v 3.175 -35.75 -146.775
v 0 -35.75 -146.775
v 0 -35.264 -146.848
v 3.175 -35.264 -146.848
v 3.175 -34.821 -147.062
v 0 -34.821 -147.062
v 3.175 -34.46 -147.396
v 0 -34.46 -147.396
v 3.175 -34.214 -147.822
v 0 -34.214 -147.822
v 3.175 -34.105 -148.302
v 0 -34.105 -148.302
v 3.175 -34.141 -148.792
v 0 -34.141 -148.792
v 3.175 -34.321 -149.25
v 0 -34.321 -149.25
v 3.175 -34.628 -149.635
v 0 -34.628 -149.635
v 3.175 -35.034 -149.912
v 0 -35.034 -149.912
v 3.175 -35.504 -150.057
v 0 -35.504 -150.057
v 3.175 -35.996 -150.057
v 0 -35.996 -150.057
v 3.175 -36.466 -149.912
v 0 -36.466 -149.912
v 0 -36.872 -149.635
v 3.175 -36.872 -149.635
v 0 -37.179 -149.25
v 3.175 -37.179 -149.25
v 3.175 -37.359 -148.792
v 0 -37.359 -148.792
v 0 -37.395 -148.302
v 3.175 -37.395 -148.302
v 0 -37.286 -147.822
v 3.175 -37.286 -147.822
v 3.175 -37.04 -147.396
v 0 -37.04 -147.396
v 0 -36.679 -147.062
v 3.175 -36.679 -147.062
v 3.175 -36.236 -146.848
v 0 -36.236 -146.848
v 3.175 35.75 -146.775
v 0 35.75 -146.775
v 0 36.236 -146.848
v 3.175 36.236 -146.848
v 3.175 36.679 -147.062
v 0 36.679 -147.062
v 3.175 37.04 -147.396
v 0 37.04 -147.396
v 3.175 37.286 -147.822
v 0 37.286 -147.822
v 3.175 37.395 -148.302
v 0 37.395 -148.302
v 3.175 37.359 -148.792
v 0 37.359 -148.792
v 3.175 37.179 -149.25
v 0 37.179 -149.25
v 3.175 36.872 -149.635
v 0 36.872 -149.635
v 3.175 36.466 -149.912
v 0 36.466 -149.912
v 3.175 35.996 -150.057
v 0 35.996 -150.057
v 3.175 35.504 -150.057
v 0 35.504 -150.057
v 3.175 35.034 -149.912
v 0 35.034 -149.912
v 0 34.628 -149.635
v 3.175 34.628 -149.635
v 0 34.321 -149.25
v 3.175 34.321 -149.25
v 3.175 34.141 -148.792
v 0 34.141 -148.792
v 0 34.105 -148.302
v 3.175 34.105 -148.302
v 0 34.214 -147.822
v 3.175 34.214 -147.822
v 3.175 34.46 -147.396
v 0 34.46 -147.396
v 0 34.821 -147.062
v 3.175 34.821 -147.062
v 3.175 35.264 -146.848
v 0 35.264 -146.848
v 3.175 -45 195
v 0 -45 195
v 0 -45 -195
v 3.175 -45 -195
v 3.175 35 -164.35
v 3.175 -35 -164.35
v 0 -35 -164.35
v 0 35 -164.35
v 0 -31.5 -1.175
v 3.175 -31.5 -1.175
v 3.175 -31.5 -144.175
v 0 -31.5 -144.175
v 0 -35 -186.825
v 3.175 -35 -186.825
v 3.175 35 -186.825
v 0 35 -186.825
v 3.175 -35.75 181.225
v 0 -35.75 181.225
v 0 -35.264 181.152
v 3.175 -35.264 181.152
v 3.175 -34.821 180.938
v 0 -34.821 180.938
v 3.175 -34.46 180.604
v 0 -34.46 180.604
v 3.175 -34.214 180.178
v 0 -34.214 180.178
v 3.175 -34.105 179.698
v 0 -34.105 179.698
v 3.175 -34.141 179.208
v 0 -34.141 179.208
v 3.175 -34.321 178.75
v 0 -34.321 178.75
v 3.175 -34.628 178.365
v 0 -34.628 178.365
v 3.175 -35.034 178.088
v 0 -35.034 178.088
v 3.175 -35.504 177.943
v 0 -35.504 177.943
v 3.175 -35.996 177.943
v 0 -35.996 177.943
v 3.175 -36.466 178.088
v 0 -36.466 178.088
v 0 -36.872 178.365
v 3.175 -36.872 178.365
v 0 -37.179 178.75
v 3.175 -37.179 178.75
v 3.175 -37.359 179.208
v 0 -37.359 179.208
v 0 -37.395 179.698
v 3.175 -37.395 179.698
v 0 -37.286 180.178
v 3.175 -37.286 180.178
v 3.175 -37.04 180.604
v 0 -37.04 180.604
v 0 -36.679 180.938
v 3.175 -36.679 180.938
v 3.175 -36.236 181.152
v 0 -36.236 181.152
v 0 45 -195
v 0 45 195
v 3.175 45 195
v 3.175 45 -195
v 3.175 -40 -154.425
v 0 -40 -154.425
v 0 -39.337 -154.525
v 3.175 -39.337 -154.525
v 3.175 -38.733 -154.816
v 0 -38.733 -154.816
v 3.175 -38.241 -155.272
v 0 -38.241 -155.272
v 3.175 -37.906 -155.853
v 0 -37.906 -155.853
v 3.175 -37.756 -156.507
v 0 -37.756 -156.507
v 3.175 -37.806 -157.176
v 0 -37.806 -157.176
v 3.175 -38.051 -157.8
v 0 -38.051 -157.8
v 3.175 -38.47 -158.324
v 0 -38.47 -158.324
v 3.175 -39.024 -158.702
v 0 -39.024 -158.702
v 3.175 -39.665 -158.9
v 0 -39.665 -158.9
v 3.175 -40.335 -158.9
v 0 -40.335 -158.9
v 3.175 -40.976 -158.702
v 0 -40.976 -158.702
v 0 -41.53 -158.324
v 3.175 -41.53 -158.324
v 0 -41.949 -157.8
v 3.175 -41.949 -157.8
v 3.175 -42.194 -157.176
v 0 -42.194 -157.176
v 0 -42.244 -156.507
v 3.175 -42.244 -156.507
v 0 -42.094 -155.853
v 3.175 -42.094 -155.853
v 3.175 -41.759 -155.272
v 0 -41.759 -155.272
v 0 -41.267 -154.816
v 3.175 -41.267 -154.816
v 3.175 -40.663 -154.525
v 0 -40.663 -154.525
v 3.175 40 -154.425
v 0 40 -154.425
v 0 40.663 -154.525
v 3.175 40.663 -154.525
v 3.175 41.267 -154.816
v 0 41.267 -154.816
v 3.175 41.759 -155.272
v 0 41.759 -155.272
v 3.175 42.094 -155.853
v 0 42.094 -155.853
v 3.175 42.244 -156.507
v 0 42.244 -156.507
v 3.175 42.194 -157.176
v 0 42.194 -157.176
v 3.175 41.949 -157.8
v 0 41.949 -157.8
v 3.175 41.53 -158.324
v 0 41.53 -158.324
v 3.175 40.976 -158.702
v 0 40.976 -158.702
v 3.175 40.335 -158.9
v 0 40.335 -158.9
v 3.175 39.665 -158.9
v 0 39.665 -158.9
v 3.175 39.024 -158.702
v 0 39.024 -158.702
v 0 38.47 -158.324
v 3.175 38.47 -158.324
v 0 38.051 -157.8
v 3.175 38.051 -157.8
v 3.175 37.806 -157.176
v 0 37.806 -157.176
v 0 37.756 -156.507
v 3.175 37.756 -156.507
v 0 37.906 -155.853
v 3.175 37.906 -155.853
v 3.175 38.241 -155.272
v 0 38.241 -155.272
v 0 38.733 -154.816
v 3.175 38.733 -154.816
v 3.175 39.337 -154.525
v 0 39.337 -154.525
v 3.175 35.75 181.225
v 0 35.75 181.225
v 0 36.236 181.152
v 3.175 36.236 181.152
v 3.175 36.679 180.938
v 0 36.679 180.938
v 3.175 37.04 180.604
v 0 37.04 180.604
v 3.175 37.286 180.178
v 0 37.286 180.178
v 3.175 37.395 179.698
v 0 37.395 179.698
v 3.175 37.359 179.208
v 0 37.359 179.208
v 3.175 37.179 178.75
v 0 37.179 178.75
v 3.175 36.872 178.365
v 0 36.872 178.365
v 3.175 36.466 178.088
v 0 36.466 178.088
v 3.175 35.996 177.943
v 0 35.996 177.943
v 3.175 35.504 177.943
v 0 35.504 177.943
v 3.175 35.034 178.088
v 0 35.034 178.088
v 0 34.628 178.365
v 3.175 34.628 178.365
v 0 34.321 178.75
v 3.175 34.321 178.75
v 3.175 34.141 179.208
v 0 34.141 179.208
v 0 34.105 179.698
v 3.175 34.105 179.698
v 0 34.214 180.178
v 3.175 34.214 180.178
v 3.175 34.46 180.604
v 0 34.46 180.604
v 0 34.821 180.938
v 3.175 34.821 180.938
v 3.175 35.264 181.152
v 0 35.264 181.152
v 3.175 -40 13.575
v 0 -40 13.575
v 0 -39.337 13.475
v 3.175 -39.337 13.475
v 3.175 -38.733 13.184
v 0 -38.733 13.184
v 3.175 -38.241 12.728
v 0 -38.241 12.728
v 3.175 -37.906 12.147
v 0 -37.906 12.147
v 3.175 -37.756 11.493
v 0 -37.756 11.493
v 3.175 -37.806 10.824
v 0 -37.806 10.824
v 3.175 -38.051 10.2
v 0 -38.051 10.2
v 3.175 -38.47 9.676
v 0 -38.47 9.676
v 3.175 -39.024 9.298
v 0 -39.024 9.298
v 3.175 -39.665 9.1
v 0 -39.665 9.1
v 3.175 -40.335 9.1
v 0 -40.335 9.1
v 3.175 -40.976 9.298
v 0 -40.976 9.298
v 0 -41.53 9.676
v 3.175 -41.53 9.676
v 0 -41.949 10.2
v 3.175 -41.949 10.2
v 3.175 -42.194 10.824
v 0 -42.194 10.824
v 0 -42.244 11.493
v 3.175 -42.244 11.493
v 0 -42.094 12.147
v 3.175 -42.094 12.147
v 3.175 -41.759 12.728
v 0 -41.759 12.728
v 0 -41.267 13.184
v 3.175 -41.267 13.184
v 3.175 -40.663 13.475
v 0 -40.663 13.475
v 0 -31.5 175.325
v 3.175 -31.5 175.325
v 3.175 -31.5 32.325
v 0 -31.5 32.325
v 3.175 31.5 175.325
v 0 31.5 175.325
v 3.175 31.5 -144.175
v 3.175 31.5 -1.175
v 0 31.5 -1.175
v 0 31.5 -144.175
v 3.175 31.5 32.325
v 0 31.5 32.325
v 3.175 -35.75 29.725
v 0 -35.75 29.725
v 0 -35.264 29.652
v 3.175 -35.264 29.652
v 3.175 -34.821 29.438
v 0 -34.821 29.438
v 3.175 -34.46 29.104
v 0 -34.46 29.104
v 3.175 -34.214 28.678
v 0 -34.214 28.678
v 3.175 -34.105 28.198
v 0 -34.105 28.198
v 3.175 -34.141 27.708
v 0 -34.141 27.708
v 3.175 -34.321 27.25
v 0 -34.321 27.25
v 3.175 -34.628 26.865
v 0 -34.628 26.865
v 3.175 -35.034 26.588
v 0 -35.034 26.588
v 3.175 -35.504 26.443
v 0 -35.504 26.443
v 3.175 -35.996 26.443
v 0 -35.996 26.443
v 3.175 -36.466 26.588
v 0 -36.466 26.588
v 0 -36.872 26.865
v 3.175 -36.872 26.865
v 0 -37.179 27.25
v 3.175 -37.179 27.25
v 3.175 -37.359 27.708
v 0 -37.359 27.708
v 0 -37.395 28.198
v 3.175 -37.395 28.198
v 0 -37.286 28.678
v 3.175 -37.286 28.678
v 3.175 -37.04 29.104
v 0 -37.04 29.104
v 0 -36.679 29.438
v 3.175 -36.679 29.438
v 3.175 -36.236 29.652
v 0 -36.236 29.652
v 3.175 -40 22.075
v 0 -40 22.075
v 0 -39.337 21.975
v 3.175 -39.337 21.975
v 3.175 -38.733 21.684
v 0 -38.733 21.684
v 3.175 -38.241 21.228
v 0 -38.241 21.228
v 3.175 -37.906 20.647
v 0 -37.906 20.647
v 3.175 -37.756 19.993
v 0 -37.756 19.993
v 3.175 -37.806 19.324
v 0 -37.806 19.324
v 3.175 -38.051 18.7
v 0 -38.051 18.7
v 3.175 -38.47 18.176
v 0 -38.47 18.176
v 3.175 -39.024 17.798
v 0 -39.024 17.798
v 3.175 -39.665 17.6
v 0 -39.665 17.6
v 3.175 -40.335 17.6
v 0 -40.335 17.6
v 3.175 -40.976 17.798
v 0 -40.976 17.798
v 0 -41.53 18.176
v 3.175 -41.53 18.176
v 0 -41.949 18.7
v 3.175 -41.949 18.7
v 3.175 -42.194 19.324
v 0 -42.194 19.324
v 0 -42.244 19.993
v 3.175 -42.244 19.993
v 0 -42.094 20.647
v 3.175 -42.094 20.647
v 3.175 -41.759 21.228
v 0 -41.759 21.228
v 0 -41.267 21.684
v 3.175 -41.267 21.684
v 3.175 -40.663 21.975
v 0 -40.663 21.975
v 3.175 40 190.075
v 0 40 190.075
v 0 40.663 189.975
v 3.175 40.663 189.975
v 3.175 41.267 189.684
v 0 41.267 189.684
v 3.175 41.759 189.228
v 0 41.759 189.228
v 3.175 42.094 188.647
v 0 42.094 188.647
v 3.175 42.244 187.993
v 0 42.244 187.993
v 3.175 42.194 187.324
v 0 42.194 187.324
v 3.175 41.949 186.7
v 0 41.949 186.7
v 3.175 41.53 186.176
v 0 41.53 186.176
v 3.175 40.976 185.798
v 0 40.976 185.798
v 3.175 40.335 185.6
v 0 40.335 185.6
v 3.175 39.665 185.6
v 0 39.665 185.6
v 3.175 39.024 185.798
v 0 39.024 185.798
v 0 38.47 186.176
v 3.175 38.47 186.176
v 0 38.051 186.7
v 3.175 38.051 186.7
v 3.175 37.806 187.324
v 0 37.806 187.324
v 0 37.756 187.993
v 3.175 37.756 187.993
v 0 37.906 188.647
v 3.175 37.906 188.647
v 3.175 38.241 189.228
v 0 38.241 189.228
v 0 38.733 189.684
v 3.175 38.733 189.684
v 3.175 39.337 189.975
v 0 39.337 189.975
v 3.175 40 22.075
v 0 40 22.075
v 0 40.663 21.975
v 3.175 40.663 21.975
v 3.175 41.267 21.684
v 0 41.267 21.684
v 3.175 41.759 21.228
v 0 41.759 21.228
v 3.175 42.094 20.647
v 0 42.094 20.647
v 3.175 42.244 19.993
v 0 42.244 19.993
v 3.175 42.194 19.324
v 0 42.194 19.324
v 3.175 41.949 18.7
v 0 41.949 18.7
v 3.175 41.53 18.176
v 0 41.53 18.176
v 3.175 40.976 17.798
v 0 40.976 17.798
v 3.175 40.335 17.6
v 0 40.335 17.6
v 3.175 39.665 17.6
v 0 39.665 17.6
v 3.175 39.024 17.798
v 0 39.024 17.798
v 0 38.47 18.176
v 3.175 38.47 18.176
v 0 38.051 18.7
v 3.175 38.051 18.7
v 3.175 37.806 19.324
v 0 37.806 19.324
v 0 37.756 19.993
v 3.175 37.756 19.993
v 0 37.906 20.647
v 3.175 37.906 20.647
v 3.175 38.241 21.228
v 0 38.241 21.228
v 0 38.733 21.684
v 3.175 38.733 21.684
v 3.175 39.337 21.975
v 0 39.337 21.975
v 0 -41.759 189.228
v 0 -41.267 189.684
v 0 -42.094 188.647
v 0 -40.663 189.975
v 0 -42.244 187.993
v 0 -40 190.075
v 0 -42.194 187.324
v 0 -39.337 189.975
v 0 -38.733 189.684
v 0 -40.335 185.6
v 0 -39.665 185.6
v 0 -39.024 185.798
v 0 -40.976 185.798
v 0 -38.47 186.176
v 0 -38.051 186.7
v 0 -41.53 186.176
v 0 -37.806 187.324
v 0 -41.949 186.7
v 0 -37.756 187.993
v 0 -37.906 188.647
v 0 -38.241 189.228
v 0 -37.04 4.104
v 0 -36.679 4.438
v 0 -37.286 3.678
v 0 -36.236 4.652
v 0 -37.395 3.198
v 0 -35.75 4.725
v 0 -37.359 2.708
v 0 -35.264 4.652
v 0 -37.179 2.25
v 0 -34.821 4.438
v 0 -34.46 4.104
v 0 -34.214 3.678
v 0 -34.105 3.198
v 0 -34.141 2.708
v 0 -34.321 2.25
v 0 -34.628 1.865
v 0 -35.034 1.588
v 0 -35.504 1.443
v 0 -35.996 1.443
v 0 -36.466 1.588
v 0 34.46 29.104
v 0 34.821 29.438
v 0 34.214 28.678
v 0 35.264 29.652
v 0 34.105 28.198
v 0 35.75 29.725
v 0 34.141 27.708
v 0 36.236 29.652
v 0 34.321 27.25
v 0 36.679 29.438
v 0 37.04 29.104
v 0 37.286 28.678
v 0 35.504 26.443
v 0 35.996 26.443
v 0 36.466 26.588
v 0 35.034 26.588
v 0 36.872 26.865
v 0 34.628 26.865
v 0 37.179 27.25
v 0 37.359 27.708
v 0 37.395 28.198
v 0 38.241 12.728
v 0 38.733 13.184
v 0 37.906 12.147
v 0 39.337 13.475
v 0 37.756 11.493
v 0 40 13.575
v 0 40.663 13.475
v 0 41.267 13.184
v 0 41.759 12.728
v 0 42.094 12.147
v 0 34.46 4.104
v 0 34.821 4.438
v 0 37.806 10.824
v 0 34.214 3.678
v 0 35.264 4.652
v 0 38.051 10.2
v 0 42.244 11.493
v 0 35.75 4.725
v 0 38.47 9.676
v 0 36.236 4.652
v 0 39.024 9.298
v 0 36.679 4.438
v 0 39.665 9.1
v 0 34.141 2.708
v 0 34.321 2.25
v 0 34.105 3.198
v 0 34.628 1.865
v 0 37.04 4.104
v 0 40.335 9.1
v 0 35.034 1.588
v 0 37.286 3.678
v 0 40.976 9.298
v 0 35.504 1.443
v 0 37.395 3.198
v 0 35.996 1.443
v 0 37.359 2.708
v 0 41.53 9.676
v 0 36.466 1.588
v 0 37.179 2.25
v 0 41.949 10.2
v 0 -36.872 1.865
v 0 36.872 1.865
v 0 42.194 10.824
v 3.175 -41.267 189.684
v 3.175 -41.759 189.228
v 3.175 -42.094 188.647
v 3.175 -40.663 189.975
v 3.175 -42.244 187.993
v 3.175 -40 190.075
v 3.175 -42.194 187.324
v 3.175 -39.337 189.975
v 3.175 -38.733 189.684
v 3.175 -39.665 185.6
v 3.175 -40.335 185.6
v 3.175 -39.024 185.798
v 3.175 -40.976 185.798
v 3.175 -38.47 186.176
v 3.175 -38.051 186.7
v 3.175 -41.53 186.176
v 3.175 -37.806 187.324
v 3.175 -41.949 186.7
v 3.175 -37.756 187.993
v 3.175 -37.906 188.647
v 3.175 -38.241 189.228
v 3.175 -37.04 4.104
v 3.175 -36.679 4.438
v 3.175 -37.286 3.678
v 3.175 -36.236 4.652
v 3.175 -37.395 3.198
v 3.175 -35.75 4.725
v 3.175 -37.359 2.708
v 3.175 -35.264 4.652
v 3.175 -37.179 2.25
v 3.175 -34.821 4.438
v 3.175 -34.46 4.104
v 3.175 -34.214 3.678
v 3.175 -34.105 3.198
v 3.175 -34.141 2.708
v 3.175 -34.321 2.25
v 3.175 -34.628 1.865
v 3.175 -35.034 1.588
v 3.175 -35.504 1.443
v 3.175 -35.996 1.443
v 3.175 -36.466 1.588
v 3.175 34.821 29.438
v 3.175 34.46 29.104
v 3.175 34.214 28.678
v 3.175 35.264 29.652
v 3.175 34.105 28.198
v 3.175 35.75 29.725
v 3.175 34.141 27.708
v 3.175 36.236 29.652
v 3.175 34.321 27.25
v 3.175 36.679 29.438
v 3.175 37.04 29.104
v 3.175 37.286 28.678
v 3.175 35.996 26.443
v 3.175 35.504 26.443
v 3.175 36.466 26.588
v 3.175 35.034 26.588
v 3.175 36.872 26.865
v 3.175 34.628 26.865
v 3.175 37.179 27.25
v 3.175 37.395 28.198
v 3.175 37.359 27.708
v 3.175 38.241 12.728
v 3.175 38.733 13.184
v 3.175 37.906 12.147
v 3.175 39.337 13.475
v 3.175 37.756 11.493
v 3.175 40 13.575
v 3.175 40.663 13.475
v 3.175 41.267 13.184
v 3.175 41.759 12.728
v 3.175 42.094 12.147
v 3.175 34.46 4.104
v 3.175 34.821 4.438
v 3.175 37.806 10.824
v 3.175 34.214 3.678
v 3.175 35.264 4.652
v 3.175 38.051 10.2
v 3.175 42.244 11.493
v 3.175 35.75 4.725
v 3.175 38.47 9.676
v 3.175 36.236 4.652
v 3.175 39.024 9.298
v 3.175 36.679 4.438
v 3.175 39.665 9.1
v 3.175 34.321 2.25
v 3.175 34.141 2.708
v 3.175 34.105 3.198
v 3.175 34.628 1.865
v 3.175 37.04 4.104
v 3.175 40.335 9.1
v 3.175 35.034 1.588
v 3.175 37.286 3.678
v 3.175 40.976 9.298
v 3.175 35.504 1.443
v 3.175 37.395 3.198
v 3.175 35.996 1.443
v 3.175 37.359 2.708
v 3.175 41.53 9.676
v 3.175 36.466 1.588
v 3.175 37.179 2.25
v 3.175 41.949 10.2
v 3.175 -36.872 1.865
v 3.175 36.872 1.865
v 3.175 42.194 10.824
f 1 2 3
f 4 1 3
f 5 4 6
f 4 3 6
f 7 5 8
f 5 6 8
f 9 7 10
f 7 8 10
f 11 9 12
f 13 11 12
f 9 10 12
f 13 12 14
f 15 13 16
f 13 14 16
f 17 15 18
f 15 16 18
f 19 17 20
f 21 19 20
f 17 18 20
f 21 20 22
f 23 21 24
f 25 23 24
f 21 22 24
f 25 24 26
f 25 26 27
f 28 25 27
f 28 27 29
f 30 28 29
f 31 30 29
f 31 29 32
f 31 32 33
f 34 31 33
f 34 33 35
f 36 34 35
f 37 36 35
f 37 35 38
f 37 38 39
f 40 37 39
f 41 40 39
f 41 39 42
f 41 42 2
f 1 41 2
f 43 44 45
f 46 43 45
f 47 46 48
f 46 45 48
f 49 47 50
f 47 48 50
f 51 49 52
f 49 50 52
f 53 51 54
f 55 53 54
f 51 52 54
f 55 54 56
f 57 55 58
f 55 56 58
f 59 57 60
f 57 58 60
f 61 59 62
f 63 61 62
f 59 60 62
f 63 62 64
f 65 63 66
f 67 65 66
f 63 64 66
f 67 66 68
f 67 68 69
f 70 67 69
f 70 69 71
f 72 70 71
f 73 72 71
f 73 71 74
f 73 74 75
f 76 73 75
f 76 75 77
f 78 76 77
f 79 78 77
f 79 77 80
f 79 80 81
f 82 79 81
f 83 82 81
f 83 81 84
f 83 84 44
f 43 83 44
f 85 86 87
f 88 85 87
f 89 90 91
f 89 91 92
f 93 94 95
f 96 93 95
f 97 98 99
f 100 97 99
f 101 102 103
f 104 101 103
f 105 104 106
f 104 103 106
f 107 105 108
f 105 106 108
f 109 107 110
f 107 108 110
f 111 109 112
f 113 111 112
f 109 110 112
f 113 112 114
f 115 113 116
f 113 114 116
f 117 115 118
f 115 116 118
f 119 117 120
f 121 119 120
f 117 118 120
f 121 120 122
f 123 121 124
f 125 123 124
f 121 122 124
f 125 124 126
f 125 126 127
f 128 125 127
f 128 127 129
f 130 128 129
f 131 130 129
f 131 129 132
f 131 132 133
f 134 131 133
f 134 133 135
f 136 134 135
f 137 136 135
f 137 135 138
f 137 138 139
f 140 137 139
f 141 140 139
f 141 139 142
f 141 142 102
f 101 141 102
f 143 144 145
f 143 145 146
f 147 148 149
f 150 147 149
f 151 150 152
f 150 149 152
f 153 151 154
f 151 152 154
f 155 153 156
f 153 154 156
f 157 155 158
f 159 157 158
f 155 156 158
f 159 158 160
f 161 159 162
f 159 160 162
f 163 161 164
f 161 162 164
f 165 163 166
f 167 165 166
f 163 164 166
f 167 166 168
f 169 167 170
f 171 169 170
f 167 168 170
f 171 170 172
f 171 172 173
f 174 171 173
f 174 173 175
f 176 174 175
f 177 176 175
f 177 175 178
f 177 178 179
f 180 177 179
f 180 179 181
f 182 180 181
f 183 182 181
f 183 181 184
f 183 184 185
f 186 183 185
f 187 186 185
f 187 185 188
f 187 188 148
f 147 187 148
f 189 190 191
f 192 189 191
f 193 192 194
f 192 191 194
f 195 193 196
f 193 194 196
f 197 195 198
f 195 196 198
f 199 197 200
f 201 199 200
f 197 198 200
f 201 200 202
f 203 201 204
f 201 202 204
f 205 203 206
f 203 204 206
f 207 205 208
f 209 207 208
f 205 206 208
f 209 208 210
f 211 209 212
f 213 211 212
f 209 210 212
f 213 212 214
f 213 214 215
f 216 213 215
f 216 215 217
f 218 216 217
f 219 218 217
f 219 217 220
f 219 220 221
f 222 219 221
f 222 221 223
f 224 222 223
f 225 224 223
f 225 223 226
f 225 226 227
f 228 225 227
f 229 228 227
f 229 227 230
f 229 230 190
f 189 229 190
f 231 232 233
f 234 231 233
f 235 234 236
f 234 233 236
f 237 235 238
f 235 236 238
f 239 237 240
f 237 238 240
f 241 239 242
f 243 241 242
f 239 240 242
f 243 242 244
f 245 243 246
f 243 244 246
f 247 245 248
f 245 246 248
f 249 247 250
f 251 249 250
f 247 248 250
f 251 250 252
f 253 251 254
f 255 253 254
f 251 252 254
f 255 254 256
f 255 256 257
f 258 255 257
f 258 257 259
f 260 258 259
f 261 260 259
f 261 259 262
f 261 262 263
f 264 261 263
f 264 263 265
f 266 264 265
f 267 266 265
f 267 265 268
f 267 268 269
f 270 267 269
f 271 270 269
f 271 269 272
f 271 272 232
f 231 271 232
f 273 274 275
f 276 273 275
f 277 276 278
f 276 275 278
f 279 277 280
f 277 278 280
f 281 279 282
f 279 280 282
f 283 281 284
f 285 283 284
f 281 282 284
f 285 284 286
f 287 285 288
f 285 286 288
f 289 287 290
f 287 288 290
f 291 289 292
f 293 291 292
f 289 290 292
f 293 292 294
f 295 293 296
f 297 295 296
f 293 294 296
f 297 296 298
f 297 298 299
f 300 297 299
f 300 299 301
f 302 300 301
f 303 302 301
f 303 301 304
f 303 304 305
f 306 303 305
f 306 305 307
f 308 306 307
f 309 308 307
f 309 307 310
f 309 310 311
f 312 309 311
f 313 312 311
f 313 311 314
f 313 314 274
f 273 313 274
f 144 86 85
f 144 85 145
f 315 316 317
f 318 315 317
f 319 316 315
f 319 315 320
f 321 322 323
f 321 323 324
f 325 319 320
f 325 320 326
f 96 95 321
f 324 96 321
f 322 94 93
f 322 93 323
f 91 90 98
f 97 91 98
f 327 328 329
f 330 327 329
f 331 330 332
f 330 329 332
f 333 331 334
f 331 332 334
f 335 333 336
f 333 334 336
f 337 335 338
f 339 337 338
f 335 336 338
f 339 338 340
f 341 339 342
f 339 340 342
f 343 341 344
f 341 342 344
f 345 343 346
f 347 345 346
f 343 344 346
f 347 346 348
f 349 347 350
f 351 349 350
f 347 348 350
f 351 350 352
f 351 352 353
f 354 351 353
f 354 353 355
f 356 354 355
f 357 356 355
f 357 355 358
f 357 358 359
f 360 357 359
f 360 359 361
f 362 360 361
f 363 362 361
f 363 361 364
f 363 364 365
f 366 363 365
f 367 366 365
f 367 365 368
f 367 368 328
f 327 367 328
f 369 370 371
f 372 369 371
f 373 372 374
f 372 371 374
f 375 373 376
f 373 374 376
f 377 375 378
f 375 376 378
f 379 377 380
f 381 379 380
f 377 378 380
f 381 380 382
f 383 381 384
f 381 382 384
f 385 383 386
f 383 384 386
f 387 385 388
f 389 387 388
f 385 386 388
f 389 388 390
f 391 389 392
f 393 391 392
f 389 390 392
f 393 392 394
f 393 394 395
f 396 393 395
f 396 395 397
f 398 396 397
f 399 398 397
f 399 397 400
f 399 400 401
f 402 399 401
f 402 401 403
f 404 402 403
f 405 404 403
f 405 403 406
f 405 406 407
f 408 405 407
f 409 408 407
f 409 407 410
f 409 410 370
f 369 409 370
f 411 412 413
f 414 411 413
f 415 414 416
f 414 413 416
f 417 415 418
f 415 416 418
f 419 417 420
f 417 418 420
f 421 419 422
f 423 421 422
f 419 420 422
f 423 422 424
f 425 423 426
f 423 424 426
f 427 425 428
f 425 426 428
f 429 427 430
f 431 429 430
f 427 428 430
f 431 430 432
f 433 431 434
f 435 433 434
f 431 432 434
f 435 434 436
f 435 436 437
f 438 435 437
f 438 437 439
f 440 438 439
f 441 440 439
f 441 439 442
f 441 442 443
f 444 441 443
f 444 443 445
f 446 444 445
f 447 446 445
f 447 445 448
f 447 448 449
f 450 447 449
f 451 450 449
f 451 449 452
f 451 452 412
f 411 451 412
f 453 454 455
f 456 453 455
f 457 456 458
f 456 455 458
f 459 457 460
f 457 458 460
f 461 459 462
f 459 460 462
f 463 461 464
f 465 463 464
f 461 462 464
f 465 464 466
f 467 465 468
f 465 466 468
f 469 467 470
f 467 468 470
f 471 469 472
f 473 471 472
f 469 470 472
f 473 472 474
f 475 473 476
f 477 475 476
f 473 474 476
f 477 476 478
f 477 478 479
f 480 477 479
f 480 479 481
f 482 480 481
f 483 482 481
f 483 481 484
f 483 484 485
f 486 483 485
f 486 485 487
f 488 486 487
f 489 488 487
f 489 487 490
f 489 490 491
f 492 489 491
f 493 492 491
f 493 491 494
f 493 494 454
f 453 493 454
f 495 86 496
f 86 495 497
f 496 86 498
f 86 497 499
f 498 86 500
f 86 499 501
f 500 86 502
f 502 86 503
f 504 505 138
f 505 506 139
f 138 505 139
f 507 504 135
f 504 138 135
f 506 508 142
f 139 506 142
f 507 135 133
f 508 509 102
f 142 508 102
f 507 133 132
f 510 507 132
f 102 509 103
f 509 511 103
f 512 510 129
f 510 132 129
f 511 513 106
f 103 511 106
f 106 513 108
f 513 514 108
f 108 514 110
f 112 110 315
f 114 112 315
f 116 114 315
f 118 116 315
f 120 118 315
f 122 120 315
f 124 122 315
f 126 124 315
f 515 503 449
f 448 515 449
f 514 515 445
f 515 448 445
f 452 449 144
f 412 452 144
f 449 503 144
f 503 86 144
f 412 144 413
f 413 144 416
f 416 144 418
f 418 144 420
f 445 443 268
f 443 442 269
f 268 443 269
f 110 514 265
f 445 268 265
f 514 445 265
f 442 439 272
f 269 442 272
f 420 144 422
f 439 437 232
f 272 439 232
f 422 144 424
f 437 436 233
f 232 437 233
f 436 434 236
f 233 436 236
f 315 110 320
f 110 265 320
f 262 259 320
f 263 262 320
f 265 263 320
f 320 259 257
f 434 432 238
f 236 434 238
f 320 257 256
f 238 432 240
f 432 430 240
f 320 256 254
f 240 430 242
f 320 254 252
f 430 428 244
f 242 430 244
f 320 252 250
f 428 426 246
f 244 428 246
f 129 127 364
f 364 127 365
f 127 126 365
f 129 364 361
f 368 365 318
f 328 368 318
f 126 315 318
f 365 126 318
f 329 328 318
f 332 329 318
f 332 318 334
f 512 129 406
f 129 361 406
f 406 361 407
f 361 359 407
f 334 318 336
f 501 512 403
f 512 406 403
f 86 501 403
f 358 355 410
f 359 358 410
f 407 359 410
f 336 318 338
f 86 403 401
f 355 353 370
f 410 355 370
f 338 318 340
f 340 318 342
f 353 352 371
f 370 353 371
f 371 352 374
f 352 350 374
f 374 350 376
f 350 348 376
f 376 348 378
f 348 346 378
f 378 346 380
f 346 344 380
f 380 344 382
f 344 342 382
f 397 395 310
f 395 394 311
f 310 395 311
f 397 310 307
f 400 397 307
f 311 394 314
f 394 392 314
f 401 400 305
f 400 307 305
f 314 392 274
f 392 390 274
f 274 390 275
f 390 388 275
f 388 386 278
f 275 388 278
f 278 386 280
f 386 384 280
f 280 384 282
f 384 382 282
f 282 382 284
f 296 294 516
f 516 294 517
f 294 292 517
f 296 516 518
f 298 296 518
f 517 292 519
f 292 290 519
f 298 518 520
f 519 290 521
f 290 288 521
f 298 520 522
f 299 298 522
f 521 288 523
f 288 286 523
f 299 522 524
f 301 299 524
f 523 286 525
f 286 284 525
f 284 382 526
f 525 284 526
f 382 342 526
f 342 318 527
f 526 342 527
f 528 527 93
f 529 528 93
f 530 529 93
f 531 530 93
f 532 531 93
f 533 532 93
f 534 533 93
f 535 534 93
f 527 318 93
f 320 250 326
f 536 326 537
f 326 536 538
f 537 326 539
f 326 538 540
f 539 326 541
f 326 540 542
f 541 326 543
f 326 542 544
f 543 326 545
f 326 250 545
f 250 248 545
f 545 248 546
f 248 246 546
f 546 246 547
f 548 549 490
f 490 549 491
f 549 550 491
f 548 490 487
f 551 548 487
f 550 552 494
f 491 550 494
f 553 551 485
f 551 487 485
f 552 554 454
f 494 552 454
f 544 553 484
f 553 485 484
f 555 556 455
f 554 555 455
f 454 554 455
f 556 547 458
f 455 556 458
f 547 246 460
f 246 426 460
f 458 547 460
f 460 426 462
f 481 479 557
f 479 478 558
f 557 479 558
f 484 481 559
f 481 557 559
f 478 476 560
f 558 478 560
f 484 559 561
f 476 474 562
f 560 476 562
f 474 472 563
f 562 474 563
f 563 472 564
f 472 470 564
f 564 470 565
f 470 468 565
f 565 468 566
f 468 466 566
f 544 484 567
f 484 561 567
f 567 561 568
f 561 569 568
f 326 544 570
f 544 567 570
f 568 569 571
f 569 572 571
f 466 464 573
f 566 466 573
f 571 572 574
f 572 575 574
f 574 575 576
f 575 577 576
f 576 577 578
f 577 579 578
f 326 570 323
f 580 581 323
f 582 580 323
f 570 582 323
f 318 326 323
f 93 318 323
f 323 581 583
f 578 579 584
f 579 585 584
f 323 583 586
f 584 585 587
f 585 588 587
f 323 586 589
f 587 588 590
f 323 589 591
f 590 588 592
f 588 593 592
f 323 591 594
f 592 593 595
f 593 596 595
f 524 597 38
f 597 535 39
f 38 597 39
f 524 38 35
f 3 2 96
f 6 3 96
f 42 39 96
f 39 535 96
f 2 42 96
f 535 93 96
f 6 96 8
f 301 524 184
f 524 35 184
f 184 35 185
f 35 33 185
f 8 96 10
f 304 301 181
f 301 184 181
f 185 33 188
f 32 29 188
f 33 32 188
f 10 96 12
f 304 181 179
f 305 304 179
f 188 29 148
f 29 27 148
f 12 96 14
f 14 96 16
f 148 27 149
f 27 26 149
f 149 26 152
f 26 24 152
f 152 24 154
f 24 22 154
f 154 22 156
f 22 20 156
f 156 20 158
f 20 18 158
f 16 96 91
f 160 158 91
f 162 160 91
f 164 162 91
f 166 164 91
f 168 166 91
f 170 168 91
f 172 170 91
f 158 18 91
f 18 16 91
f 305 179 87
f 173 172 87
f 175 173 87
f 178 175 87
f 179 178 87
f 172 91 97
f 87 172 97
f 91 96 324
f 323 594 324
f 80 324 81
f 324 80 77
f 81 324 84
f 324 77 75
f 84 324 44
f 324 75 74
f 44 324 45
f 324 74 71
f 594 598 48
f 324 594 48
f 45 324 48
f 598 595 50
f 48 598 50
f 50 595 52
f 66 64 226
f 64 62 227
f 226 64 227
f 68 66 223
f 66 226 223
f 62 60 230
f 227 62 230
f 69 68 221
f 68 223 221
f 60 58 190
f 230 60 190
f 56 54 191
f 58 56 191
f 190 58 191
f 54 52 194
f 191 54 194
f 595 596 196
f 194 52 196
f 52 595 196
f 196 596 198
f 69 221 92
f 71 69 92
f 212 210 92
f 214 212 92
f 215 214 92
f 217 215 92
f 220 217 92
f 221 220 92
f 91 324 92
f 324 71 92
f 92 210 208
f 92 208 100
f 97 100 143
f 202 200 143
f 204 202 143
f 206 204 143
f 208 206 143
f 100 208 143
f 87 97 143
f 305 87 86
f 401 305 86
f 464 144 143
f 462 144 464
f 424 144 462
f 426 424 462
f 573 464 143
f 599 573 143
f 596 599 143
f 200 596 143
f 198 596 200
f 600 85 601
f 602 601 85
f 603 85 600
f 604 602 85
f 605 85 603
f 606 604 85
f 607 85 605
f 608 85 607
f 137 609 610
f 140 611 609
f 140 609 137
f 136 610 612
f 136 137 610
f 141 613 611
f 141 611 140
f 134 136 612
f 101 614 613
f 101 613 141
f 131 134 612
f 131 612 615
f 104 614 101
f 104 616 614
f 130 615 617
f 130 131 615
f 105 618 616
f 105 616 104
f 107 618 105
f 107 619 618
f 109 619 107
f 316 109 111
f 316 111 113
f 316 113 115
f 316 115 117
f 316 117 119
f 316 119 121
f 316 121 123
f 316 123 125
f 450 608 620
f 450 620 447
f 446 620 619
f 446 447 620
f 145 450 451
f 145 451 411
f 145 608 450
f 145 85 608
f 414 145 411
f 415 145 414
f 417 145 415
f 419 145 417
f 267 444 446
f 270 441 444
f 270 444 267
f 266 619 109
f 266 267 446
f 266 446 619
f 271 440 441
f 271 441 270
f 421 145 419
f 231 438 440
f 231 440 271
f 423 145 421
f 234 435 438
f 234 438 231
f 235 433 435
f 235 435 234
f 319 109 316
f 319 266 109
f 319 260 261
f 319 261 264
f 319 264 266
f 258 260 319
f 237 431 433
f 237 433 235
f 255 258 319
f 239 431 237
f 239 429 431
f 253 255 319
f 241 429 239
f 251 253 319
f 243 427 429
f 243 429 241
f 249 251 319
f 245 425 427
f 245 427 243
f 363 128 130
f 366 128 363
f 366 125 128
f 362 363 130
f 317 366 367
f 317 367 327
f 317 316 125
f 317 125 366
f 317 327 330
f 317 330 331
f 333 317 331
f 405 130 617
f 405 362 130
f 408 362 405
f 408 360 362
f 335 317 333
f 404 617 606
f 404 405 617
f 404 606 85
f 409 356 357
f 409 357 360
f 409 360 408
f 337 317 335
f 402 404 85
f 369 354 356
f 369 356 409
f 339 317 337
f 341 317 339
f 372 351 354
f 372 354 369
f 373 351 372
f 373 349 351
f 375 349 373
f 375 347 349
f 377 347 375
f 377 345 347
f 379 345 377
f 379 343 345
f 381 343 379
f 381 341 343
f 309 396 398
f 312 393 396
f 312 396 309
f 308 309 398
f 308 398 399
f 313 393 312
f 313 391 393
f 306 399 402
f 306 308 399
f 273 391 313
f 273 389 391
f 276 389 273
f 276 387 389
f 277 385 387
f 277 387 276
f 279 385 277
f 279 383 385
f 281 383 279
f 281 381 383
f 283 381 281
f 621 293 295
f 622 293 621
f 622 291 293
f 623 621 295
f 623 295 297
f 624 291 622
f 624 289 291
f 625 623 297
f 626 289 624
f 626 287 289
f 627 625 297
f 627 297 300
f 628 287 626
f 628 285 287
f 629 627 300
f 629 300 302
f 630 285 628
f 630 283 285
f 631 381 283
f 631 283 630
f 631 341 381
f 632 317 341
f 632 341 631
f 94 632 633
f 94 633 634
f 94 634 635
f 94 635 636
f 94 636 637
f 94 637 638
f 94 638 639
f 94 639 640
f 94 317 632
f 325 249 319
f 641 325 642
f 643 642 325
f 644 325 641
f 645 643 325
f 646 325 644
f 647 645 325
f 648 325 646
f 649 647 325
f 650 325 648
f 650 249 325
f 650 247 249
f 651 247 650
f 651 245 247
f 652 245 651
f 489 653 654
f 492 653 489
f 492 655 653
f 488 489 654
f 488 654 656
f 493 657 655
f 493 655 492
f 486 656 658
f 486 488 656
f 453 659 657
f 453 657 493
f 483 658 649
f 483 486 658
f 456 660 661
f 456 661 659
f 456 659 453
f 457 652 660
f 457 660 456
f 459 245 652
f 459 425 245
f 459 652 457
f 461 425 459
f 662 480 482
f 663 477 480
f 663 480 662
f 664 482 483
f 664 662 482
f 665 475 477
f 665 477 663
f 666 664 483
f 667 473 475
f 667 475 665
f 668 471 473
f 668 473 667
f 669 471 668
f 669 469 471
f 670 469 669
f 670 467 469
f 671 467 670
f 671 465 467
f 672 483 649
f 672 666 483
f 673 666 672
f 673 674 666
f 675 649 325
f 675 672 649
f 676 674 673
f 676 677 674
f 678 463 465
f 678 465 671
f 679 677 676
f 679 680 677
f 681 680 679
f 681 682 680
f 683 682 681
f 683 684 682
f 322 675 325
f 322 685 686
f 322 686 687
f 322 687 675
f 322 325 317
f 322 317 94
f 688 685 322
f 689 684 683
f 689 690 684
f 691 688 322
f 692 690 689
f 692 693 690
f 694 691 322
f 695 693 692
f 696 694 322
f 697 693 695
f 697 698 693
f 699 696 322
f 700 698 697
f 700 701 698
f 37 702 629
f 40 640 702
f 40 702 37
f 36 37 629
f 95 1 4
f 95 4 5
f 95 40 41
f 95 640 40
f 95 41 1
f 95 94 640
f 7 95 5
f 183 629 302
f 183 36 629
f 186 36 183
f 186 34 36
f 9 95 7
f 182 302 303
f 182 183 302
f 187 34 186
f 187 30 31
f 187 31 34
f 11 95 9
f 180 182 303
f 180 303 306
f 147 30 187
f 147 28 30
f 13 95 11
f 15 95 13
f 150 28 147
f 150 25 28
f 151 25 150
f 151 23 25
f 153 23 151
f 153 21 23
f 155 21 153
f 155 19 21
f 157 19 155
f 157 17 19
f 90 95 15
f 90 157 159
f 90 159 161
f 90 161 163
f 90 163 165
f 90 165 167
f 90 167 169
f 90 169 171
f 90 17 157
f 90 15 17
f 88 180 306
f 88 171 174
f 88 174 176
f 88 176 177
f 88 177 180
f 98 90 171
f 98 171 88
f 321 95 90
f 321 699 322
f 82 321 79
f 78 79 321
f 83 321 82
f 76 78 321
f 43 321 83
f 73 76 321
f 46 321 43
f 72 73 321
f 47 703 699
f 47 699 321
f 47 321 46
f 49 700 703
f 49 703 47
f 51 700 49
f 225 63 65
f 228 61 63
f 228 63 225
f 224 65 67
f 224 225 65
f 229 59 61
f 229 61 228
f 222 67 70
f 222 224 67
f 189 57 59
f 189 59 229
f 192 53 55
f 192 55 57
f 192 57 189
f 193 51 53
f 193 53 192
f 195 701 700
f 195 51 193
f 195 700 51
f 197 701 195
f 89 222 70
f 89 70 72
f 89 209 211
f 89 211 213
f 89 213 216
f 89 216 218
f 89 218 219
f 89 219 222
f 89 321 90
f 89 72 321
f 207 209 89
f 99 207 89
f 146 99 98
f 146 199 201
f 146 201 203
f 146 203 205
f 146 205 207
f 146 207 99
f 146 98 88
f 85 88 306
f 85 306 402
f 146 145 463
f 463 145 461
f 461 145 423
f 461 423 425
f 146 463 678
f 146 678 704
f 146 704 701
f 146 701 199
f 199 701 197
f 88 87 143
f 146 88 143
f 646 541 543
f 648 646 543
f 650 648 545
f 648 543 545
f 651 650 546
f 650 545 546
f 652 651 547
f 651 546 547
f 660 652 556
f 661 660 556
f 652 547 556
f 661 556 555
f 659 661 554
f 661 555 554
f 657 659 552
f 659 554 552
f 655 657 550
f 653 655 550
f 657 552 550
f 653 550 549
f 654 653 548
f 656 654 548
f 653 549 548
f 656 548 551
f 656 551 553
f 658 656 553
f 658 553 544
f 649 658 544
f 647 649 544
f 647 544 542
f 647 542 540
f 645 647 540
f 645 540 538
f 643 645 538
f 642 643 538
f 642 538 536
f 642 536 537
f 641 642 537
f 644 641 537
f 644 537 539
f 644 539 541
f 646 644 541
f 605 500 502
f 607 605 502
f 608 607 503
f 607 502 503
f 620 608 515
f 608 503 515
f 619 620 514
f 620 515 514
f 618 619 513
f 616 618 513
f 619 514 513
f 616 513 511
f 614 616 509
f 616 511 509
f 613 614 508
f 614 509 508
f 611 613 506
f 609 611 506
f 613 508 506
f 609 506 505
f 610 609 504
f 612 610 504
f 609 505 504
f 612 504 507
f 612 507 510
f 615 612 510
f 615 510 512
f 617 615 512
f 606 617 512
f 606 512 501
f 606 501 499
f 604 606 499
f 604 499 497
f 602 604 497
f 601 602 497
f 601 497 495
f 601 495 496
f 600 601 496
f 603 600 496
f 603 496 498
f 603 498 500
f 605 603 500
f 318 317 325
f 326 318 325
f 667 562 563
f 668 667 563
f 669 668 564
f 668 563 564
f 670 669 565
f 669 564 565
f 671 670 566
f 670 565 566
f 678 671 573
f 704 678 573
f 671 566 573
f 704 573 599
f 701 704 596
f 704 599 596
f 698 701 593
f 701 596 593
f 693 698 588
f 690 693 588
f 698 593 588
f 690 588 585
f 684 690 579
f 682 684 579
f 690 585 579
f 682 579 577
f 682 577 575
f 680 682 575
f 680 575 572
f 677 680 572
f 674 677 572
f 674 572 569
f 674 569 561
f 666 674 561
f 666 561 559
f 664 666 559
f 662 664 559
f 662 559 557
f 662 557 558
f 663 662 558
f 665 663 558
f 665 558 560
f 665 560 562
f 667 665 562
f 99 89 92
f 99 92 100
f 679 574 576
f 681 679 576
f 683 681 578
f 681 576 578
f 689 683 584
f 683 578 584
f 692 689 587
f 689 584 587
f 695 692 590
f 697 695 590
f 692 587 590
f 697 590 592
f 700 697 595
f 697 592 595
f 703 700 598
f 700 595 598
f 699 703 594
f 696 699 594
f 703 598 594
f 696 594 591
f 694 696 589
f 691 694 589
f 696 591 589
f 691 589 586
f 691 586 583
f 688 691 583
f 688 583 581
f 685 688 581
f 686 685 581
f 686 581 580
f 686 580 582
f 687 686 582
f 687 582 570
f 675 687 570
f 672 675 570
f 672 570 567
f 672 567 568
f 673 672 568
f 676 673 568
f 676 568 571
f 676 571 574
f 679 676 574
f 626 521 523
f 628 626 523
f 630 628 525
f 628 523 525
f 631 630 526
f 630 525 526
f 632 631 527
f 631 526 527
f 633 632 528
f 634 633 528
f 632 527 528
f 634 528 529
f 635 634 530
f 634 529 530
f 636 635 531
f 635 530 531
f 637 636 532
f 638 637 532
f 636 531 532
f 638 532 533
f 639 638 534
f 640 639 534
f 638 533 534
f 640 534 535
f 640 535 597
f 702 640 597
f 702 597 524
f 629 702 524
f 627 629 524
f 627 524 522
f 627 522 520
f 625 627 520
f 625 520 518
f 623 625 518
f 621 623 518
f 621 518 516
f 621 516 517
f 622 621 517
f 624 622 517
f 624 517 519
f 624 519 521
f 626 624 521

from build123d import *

# Parameters (mm, degrees)
SKETCH1_W             = 390
SKETCH1_H             = 90
BOSS_EXTRUDE1_DEPTH   = 3.175
SKETCH2_W             = 143
SKETCH2_H             = 63
CUT_EXTRUDE1_DEPTH    = 3.175
M4X0_7_TAPPED_HOLE1_D = 3.3
SKETCH6_W             = 22.475
SKETCH6_H             = 70
CUT_EXTRUDE2_DEPTH    = 3.175
M4_CLEARANCE_HOLE2_D  = 4.5


with BuildPart() as part:
    # Sketch1 → Boss-Extrude1 (new body)
    with BuildSketch(Plane(origin=(0, 0, 0), x_dir=(0, 0, -1), z_dir=(1, 0, 0))):
        Rectangle(SKETCH1_W, SKETCH1_H)
    extrude(amount=BOSS_EXTRUDE1_DEPTH)

    # Sketch2 → Cut-Extrude1 (cut)
    with BuildSketch(Plane(origin=(3.175, 0, 0), x_dir=(0, 0, -1), z_dir=(1, 0, 0))):
        with Locations((72.675, 0)):
            Rectangle(SKETCH2_W, SKETCH2_H)
        with Locations((-103.825, 0)):
            Rectangle(SKETCH2_W, SKETCH2_H)
    extrude(amount=-CUT_EXTRUDE1_DEPTH, mode=Mode.SUBTRACT)

    # M4x0.7 Tapped Hole1 (through all)
    with Locations(Plane(origin=(3.175, 0, 0), x_dir=(0, 0, -1), z_dir=(1, 0, 0))):
        with Locations((-103.825, 0), (-28.075, 35.75), (-179.575, -35.75), (-179.575, 35.75), (-28.075, -35.75), (72.675, 0), (148.425, 35.75), (-3.075, -35.75), (-3.075, 35.75), (148.425, -35.75)):
            Hole(M4X0_7_TAPPED_HOLE1_D / 2)

    # Sketch6 → Cut-Extrude2 (cut)
    with BuildSketch(Plane(origin=(3.175, 0, 0), x_dir=(0, 0, -1), z_dir=(1, 0, 0))):
        with Locations((175.5875, 0)):
            Rectangle(SKETCH6_W, SKETCH6_H)
    extrude(amount=-CUT_EXTRUDE2_DEPTH, mode=Mode.SUBTRACT)

    # M4 Clearance Hole2 (through all)
    with Locations(Plane(origin=(3.175, 0, 0), x_dir=(0, 0, -1), z_dir=(1, 0, 0))):
        with Locations((-103.825, 0), (-19.825, 40), (-187.825, -40), (-187.825, 40), (-19.825, -40), (72.675, 0), (156.675, 40), (-11.325, -40), (-11.325, 40), (156.675, -40)):
            Hole(M4_CLEARANCE_HOLE2_D / 2)


solid = part.part
